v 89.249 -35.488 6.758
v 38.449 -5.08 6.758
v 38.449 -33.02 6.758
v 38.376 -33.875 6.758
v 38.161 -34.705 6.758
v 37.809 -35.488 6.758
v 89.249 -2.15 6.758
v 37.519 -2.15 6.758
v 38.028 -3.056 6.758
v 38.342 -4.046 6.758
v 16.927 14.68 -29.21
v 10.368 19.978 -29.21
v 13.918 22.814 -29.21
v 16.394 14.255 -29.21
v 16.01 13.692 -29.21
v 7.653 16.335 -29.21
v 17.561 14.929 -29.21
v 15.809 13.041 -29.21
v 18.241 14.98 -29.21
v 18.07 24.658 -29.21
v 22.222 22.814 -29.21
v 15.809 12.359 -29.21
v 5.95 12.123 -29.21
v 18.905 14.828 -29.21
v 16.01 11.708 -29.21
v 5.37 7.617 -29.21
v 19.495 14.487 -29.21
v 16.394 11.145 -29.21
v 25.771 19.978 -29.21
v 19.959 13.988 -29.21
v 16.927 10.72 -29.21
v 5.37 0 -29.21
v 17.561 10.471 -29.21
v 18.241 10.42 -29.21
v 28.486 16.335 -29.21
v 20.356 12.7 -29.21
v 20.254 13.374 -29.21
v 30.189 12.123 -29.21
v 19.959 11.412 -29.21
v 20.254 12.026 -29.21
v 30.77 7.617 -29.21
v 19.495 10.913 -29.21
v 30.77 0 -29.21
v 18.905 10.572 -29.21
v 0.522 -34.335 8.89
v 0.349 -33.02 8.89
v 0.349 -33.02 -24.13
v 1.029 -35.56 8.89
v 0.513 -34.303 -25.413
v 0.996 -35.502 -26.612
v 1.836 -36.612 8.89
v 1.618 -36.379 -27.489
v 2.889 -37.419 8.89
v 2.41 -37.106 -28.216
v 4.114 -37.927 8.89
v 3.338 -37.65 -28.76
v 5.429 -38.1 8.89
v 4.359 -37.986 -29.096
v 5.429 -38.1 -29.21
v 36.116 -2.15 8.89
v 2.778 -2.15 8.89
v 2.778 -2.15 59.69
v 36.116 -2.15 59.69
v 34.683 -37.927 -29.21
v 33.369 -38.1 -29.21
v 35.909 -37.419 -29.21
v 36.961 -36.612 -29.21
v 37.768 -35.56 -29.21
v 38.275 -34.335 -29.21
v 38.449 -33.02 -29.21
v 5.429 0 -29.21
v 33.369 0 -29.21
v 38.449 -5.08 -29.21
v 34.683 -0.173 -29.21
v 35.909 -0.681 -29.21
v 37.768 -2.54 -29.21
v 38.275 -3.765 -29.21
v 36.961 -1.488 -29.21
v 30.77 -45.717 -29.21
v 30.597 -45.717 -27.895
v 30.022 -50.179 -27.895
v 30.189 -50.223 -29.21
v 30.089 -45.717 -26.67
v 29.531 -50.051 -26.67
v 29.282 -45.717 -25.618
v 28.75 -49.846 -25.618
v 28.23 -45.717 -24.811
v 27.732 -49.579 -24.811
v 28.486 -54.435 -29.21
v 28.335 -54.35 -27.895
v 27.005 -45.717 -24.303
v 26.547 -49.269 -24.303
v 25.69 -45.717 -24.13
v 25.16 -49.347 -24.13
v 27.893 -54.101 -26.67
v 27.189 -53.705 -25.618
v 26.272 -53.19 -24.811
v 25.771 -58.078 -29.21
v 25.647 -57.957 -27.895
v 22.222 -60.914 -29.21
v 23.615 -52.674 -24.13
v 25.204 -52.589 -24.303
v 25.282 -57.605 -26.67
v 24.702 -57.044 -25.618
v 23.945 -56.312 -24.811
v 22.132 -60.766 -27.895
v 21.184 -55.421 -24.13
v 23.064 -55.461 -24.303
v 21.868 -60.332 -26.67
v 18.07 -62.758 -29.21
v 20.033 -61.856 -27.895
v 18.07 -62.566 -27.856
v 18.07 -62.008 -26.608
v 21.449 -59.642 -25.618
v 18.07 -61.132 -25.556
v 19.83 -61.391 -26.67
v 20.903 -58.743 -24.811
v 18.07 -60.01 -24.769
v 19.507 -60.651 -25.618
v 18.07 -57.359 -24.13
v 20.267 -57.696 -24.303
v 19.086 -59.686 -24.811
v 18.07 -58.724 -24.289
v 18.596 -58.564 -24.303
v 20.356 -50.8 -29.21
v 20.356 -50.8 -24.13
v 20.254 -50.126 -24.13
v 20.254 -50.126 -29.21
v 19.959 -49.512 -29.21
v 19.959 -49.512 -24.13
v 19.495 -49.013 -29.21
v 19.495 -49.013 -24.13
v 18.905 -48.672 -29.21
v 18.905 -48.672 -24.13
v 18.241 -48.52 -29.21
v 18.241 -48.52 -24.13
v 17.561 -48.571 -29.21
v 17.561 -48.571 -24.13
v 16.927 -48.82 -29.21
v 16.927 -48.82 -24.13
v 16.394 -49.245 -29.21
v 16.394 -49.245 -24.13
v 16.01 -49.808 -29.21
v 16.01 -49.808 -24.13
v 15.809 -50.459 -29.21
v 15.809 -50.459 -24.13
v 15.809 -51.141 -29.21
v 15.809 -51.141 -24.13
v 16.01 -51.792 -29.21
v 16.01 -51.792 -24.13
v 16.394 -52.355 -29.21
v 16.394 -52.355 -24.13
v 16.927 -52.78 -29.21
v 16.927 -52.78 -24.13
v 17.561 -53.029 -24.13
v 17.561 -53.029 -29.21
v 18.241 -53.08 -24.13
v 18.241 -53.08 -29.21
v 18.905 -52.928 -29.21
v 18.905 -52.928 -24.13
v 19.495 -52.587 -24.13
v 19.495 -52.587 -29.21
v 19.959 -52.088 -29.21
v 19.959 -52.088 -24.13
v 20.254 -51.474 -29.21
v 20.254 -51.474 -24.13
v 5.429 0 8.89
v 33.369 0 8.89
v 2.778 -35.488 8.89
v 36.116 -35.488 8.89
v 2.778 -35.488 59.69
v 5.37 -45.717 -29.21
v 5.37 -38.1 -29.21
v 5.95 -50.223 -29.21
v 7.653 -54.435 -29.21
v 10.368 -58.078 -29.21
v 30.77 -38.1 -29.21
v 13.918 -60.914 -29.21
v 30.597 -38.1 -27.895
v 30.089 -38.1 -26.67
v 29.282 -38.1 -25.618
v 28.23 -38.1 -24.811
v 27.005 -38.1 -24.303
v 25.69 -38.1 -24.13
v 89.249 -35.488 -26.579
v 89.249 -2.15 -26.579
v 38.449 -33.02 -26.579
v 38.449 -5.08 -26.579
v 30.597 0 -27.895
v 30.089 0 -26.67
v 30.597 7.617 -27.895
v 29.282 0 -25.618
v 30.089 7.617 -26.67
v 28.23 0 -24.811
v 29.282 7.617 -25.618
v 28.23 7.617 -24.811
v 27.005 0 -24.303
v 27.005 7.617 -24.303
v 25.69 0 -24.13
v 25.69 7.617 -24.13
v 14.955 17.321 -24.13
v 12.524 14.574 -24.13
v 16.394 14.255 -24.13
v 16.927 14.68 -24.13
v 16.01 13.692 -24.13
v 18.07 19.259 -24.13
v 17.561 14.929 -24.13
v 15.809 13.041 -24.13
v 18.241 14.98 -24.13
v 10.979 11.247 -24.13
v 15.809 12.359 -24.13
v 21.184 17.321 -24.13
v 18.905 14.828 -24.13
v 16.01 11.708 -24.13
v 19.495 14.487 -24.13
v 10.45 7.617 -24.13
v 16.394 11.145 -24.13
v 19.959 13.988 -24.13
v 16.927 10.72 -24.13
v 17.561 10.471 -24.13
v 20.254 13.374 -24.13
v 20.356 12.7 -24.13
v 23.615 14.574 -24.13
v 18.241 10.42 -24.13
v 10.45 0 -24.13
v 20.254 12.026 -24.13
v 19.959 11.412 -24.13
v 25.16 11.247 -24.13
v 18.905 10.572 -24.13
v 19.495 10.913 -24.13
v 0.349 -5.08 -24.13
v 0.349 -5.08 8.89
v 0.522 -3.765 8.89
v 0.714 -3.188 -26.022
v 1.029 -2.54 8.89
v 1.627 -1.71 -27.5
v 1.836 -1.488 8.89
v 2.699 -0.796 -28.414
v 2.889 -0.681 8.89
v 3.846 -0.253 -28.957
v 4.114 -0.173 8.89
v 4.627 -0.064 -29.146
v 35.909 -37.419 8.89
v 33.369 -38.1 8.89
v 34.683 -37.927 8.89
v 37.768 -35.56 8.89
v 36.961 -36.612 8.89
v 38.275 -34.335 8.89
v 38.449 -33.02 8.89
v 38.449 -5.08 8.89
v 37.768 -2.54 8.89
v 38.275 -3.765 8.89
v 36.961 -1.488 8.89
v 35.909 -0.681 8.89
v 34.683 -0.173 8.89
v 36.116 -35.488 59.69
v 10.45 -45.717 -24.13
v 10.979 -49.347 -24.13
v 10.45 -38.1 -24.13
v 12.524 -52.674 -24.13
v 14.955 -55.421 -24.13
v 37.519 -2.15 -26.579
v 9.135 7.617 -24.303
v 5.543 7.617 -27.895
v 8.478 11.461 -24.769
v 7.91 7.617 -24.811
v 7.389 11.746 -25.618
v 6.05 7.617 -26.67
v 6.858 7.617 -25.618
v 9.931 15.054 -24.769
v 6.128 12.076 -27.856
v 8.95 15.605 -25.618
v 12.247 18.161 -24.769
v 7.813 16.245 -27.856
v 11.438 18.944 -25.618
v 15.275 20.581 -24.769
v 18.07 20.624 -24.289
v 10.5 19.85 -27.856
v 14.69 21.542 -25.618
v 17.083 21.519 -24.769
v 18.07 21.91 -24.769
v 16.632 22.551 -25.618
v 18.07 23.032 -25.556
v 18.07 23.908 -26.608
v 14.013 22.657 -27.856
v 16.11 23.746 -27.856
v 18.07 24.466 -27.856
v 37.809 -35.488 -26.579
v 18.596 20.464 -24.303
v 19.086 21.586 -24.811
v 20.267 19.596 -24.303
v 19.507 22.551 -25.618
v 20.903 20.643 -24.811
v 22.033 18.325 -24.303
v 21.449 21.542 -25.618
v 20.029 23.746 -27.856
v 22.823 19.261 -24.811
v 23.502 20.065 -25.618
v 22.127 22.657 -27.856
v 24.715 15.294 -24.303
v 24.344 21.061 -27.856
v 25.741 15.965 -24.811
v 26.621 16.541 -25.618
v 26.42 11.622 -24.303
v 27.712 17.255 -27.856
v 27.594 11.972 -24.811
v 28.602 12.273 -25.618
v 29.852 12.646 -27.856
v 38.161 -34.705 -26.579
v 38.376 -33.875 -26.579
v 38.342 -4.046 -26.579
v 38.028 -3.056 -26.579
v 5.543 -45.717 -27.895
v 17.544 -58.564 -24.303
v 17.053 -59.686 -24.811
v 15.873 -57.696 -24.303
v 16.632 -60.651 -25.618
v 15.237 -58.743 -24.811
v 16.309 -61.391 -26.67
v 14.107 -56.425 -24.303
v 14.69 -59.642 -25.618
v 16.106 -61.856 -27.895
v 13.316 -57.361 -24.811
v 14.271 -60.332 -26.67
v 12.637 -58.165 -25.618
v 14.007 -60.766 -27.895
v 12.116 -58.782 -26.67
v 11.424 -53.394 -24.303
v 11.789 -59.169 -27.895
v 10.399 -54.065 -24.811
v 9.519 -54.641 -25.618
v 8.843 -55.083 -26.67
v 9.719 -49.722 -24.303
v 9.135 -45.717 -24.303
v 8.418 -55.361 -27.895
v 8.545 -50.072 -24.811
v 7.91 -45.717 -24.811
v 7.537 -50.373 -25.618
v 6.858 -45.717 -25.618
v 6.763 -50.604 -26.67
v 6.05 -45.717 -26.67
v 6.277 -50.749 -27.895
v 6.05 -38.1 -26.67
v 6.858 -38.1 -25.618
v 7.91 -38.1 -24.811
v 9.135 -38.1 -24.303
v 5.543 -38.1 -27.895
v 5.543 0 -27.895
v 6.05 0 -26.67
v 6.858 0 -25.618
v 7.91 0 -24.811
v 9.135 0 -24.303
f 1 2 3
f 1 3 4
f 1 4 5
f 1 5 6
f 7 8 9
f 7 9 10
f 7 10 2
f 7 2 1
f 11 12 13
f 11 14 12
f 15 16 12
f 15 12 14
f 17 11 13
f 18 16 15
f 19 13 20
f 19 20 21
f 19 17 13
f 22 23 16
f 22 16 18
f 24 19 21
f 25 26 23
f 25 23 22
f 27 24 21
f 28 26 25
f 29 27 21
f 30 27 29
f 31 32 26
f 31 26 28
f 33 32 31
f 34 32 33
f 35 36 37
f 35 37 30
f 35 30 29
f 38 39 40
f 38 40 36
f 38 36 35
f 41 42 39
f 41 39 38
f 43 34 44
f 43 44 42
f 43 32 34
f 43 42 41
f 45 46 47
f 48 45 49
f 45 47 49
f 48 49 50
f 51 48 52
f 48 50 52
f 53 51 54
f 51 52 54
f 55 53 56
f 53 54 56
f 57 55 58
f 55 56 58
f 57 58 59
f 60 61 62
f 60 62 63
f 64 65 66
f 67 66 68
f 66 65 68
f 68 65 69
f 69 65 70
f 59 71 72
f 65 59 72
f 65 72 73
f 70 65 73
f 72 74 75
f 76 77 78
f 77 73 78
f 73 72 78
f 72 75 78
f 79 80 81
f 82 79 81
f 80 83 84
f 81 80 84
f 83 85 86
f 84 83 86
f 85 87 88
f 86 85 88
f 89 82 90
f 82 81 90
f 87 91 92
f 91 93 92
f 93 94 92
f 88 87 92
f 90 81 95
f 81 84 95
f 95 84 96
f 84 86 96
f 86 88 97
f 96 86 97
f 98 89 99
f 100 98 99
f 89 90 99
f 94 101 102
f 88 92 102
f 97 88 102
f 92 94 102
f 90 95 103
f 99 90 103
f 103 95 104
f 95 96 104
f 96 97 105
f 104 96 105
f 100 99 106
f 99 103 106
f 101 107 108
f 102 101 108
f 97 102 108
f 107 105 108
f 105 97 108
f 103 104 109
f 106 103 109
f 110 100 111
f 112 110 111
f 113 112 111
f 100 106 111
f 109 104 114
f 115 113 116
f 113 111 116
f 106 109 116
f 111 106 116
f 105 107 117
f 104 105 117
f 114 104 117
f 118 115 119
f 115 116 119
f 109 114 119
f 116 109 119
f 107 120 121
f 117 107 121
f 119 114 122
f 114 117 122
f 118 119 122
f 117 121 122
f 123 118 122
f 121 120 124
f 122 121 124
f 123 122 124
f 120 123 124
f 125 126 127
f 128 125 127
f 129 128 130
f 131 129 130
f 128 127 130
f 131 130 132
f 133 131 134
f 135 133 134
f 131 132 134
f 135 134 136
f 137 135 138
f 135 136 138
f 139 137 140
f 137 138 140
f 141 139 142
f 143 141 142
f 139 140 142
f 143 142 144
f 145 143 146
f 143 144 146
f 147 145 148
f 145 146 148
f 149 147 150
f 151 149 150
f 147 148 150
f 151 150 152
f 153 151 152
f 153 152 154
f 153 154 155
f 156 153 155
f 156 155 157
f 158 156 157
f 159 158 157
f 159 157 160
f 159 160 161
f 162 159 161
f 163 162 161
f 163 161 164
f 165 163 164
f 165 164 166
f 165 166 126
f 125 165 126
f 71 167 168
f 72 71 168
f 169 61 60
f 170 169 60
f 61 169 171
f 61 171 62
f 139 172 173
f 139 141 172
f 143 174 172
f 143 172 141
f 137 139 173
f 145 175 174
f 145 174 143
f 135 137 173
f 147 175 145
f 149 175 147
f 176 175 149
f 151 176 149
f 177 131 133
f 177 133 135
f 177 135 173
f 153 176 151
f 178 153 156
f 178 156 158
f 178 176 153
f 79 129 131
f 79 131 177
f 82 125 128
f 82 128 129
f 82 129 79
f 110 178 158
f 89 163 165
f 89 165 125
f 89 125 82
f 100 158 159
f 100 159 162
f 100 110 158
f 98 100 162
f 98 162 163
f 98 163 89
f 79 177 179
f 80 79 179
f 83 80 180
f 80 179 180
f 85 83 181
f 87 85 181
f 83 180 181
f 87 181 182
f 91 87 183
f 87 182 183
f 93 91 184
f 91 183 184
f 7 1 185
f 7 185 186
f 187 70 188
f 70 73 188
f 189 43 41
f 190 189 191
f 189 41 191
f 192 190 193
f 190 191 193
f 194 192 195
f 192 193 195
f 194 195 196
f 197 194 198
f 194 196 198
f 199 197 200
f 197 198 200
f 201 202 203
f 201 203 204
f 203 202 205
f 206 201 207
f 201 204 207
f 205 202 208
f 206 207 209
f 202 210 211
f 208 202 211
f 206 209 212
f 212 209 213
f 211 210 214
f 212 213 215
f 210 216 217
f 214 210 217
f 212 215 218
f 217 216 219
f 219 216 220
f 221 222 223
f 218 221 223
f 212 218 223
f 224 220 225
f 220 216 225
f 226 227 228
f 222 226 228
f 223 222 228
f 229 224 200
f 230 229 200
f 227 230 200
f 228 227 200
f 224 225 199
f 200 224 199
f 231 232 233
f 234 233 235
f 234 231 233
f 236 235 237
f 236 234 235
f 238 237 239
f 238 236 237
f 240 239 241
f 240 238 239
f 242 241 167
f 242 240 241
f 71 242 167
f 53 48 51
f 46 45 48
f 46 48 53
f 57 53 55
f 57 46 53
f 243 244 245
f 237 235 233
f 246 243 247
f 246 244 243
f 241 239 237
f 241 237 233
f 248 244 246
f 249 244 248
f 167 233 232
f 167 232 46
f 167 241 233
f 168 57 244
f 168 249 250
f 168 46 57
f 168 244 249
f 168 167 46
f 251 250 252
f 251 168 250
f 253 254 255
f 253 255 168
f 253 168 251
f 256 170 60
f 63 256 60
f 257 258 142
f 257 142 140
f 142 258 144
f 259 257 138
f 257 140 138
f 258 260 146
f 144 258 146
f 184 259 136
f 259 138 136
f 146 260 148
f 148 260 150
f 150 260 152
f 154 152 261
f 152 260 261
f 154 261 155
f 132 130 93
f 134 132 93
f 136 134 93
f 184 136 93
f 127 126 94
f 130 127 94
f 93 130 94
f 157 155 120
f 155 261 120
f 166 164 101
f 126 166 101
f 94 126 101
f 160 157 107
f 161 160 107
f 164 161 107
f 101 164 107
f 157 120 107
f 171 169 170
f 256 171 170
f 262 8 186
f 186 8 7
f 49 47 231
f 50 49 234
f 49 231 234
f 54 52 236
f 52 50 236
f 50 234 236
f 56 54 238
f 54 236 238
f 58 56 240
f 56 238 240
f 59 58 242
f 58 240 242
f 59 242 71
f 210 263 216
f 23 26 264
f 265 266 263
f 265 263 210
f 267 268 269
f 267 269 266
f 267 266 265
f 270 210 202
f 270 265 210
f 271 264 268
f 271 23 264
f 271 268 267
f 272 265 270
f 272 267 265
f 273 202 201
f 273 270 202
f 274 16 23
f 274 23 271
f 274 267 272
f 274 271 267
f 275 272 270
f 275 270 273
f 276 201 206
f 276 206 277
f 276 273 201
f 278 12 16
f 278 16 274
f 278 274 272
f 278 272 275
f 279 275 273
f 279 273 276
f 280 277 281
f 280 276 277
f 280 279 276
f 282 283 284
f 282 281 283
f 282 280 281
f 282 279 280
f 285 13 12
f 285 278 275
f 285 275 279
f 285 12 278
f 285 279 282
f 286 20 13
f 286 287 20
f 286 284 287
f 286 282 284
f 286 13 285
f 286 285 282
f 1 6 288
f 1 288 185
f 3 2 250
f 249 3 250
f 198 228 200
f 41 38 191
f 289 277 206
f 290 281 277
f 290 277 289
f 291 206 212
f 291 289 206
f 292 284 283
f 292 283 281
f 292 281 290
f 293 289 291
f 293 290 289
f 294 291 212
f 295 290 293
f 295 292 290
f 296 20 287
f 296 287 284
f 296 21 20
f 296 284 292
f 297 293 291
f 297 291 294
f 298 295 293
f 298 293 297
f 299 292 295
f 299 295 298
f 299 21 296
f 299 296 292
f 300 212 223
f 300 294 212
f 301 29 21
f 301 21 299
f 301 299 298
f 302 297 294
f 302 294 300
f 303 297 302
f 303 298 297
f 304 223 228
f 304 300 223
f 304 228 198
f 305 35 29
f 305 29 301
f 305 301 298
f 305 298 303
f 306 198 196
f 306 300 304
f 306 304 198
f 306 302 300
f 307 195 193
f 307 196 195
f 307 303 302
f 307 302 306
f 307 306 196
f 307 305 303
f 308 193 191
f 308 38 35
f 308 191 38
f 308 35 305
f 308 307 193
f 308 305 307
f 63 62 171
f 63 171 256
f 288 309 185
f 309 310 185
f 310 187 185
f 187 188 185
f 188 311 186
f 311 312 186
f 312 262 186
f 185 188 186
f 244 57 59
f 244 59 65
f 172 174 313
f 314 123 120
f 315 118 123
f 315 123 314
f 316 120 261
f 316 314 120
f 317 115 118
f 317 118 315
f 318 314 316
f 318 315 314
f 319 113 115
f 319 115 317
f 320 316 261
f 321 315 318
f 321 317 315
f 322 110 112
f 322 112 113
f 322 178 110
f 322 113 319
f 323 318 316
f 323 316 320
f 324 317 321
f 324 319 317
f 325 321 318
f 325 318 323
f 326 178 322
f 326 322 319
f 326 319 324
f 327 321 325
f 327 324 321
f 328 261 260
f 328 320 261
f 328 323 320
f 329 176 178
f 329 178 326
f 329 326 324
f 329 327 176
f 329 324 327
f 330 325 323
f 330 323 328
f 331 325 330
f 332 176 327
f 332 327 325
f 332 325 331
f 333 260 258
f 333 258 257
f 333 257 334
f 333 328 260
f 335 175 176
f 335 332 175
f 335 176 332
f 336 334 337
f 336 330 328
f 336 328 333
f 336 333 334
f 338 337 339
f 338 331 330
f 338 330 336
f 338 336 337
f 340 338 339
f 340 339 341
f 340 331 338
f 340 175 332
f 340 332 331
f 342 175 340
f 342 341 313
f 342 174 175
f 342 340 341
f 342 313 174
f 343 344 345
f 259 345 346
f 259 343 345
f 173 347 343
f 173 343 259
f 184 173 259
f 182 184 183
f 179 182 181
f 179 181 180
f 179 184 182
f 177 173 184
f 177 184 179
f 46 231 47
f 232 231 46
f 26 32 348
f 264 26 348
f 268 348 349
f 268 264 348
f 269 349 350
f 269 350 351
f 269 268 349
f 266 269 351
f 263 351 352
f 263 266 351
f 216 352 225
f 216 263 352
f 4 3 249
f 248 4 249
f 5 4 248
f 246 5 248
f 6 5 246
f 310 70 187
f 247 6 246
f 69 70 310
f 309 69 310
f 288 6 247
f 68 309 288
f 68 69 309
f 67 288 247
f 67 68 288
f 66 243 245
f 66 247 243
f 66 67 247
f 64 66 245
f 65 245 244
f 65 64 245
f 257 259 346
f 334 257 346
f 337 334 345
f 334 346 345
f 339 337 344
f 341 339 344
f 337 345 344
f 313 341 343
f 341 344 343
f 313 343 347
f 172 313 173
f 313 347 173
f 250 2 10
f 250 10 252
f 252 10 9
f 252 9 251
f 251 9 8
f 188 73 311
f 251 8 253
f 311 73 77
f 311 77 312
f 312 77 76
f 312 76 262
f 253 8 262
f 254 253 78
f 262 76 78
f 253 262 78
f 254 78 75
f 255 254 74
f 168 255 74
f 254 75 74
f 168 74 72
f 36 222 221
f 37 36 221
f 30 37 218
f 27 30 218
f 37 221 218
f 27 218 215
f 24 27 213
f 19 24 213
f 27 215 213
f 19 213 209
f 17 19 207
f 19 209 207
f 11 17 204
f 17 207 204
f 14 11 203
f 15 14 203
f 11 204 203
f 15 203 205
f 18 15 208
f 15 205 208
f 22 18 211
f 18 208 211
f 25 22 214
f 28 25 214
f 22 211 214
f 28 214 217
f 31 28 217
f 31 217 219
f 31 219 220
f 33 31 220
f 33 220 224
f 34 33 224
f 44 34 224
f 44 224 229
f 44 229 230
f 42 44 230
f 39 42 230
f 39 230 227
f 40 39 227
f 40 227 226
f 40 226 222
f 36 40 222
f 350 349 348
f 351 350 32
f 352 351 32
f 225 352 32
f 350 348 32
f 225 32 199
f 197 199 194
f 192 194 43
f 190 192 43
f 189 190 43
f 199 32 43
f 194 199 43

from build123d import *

# Parameters (mm, degrees)
F0_W           = 38.1
F0_H           = 38.1
F1_DEPTH       = 38.1
F2_W           = 33.3375
F2_H           = 33.3375
F3_DEPTH       = 50.8
F4_W           = 33.3375
F4_H           = 33.3375
F5_DEPTH       = 50.8
F6_W           = 25.4
F6_H           = 25.4
F7_DEPTH       = 5.08
F8_R           = 2.286
F9_DEPTH       = 83.82
F10_T1_DEPTH   = 93.9954855022
F10_2_T1_DEPTH = 93.9954855022
F11_T1_DEPTH   = 63.5
F11_T3_DEPTH   = 63.5
F11_T8_DEPTH   = 63.5
F11_T14_DEPTH  = 63.5
F11_T20_DEPTH  = 63.5
F11_T27_DEPTH  = 63.5
F11_T33_DEPTH  = 63.5
F11_T39_DEPTH  = 63.5
F11_T45_DEPTH  = 63.5
F11_T51_DEPTH  = 63.5
F11_T58_DEPTH  = 63.5
F11_T64_DEPTH  = 63.5
F11_2_T1_DEPTH = 20.3169028996
F11_2_T4_ANGLE = 114.3203710668
F11_2_T6_ANGLE = 114.3203710677
F11_3_T1_DEPTH = 20.3169028996
F11_3_T4_ANGLE = 114.3203710668
F11_3_T6_ANGLE = 114.3203710677


# Not quite as in the source:
# - a fillet or chamfer that OpenCascade refuses, or shapes differently, is made with other operations: its cross-section is extruded or revolved along the edge and cut away or added


with BuildPart() as f1:
    # F0 (on Front) → F1 (new body)
    with BuildSketch(Plane.XZ):
        with Locations((19.3985427063, -10.1599991322)):
            Rectangle(F0_W, F0_H)
    extrude(amount=F1_DEPTH)

    # F2 (on face) → F3 (join)
    with BuildSketch(Plane.YZ.offset(38.4485427063)):
        with Locations((-18.8190903282, -9.9104456074)):
            Rectangle(F2_W, F2_H)
    extrude(amount=F3_DEPTH)

    # F11: fillet of radius 5.08 on 5 edges, made by hand

    # F11_s2 → F11_t1 (cut)
    with BuildSketch(Plane.XY.offset(-41.9099991322)):
        with BuildLine():
            ThreePointArc((0.3485427063, -5.08), (1.8364402579, -1.4878975516), (5.4285427063, 0))
            Line((5.4285427063, 0), (0.3485427063, 0))
            Line((0.3485427063, 0), (0.3485427063, -5.08))
        make_face()
        with BuildLine():
            ThreePointArc((0.3485427063, -33.02), (1.8364402579, -36.6121024484), (5.4285427063, -38.1))
            Line((5.4285427063, -38.1), (0.3485427063, -38.1))
            Line((0.3485427063, -38.1), (0.3485427063, -33.02))
        make_face()
    extrude(amount=F11_T1_DEPTH, mode=Mode.SUBTRACT)

    # F11_s4 → F11_t3 (cut)
    with BuildSketch(Plane.XZ.offset(-12.7)):
        with BuildLine():
            ThreePointArc((0.3485427063, -24.1299991322), (1.8364402579, -27.7221015806), (5.4285427063, -29.2099991322))
            Line((5.4285427063, -29.2099991322), (0.3485427063, -29.2099991322))
            Line((0.3485427063, -29.2099991322), (0.3485427063, -24.1299991322))
        make_face()
    extrude(amount=F11_T3_DEPTH, mode=Mode.SUBTRACT)


with BuildPart() as f5:
    # F4 (on face) → F5 (new body)
    with BuildSketch(Plane.XY.offset(8.8900008678)):
        with Locations((19.4469346859, -18.8190890476)):
            Rectangle(F4_W, F4_H)
    extrude(amount=F5_DEPTH)


with BuildPart() as f7:
    # F6 (on face) → F7 (new body)
    with BuildSketch(Plane(origin=(0, 0, -29.2099991322), x_dir=(1, 0, 0), z_dir=(0, 0, -1))):
        with Locations((18.0697256371, -12.7)):
            Rectangle(F6_W, F6_H)
    extrude(amount=-F7_DEPTH)


with BuildPart() as f7b:
    # F6 (on face) → F7, piece 2 (new body)
    with BuildSketch(Plane(origin=(0, 0, -29.2099991322), x_dir=(1, 0, 0), z_dir=(0, 0, -1))):
        with Locations((18.0697256371, 50.8)):
            Rectangle(F6_W, F6_H)
    extrude(amount=-F7_DEPTH)


with BuildPart() as f9_tool:
    # F8 (on face) → F9 (new body)
    with BuildSketch(Plane.XY.offset(-24.1299991322)):
        with Locations((18.0697256371, -50.8)):
            Circle(F8_R)
        with Locations((18.0697256371, 12.7)):
            Circle(F8_R)
    extrude(amount=-F9_DEPTH)


with BuildPart() as f7_1:
    add(f7.part)

    # F9: cut by f9_tool
    add(f9_tool.part, mode=Mode.SUBTRACT)

    # F10: fillet of radius 17.7830971004 on 2 edges, made by hand

    # F10_s2 → F10_t1 (cut)
    with BuildSketch(Plane.XY.offset(-73.6677418833)):
        with BuildLine():
            ThreePointArc((5.3697256371, 7.6169028996), (10.5782741874, 20.1914514498), (23.1528227376, 25.4))
            Line((23.1528227376, 25.4), (5.3697256371, 25.4))
            Line((5.3697256371, 25.4), (5.3697256371, 7.6169028996))
        make_face()
        with BuildLine():
            ThreePointArc((30.7697256371, 7.6169028996), (25.5611770869, 20.1914514498), (12.9866285367, 25.4))
            Line((12.9866285367, 25.4), (30.7697256371, 25.4))
            Line((30.7697256371, 25.4), (30.7697256371, 7.6169028996))
        make_face()
    extrude(amount=F10_T1_DEPTH, mode=Mode.SUBTRACT)

    # F11#2: fillet of radius 5.08 on 2 edges, made by hand

    # F11_2_s2 → F11_2_t1 (cut)
    with BuildSketch(Plane.XZ.offset(-7.6169028996)):
        with BuildLine():
            ThreePointArc((30.7697256371, -29.2099991322), (29.2818280856, -25.6178966837), (25.6897256371, -24.1299991322))
            Line((25.6897256371, -24.1299991322), (30.7697256371, -24.1299991322))
            Line((30.7697256371, -24.1299991322), (30.7697256371, -29.2099991322))
        make_face()
        with BuildLine():
            ThreePointArc((5.3697256371, -29.2099991322), (6.8576231887, -25.6178966837), (10.4497256371, -24.1299991322))
            Line((10.4497256371, -24.1299991322), (5.3697256371, -24.1299991322))
            Line((5.3697256371, -24.1299991322), (5.3697256371, -29.2099991322))
        make_face()
    extrude(amount=F11_2_T1_DEPTH, mode=Mode.SUBTRACT)

    # F11_2_s3 → F11_2_t4 (revolve, cut)
    with BuildSketch(Plane.XZ.offset(-7.6169028995)):
        with BuildLine():
            ThreePointArc((10.4497256371, -24.1299991322), (6.8576231887, -25.6178966837), (5.3697256371, -29.2099991322))
            Line((5.3697256371, -29.2099991322), (5.3697256371, -24.1299991322))
            Line((5.3697256371, -24.1299991322), (10.4497256371, -24.1299991322))
        make_face()
    revolve(axis=Axis((23.1528227376, 7.6169028995, -24.1299991322), (0, 0, -1)), revolution_arc=F11_2_T4_ANGLE, mode=Mode.SUBTRACT)

    # F11_2_s5 → F11_2_t6 (revolve, cut)
    with BuildSketch(Plane(origin=(13.6425072573, 6.165668504, 0), x_dir=(0, 0, 1), z_dir=(-0.9112569083, -0.4118383749, 0))):
        with BuildLine():
            ThreePointArc((-24.1299991322, 14.2956604954), (-25.6178966837, 17.8877629438), (-29.2099991322, 19.3756604954))
            Line((-29.2099991322, 19.3756604954), (-24.1299991322, 19.3756604954))
            Line((-24.1299991322, 19.3756604954), (-24.1299991322, 14.2956604954))
        make_face()
    revolve(axis=Axis((12.9866285367, 7.6169028996, -24.1299991322), (0, 0, -1)), revolution_arc=F11_2_T6_ANGLE, mode=Mode.SUBTRACT)


with BuildPart() as f7b_1:
    add(f7b.part)

    # F9: cut by f9_tool
    add(f9_tool.part, mode=Mode.SUBTRACT)

    # F10#2: fillet of radius 17.7830971004 on 2 edges, made by hand

    # F10_2_s2 → F10_2_t1 (cut)
    with BuildSketch(Plane.XY.offset(-73.6677418833)):
        with BuildLine():
            ThreePointArc((23.1528227376, -63.5), (10.5782741874, -58.2914514498), (5.3697256371, -45.7169028996))
            Line((5.3697256371, -45.7169028996), (5.3697256371, -63.5))
            Line((5.3697256371, -63.5), (23.1528227376, -63.5))
        make_face()
        with BuildLine():
            ThreePointArc((12.9866285367, -63.5), (25.5611770869, -58.2914514498), (30.7697256371, -45.7169028996))
            Line((30.7697256371, -45.7169028996), (30.7697256371, -63.5))
            Line((30.7697256371, -63.5), (12.9866285367, -63.5))
        make_face()
    extrude(amount=F10_2_T1_DEPTH, mode=Mode.SUBTRACT)

    # F11#3: fillet of radius 5.08 on 2 edges, made by hand

    # F11_3_s2 → F11_3_t1 (cut)
    with BuildSketch(Plane.XZ.offset(25.4)):
        with BuildLine():
            ThreePointArc((30.7697256371, -29.2099991322), (29.2818280856, -25.6178966837), (25.6897256371, -24.1299991322))
            Line((25.6897256371, -24.1299991322), (30.7697256371, -24.1299991322))
            Line((30.7697256371, -24.1299991322), (30.7697256371, -29.2099991322))
        make_face()
        with BuildLine():
            ThreePointArc((10.4497256371, -24.1299991322), (6.8576231887, -25.6178966837), (5.3697256371, -29.2099991322))
            Line((5.3697256371, -29.2099991322), (5.3697256371, -24.1299991322))
            Line((5.3697256371, -24.1299991322), (10.4497256371, -24.1299991322))
        make_face()
    extrude(amount=F11_3_T1_DEPTH, mode=Mode.SUBTRACT)

    # F11_3_s3 → F11_3_t4 (revolve, cut)
    with BuildSketch(Plane(origin=(2.0687305768, 0.9349532839, 0), x_dir=(0, 0, 1), z_dir=(0.9112569083, 0.4118383749, 0))):
        with BuildLine():
            ThreePointArc((-24.1299991322, 63.8981615853), (-25.6178966837, 67.4902640337), (-29.2099991322, 68.9781615853))
            Line((-29.2099991322, 68.9781615853), (-24.1299991322, 68.9781615853))
            Line((-24.1299991322, 68.9781615853), (-24.1299991322, 63.8981615853))
        make_face()
    revolve(axis=Axis((23.1528227376, -45.7169028995, -24.1299991322), (0, 0, -1)), revolution_arc=F11_3_T4_ANGLE, mode=Mode.SUBTRACT)

    # F11_3_s5 → F11_3_t6 (revolve, cut)
    with BuildSketch(Plane.XZ.offset(45.7169028996)):
        with BuildLine():
            ThreePointArc((30.7697256371, -29.2099991322), (29.2818280855, -25.6178966837), (25.6897256371, -24.1299991322))
            Line((25.6897256371, -24.1299991322), (30.7697256371, -24.1299991322))
            Line((30.7697256371, -24.1299991322), (30.7697256371, -29.2099991322))
        make_face()
    revolve(axis=Axis((12.9866285367, -45.7169028996, -24.1299991322), (0, 0, -1)), revolution_arc=F11_3_T6_ANGLE, mode=Mode.SUBTRACT)


with BuildPart() as f11_tool6:
    # F11_s7 → F11_t8 (new body)
    with BuildSketch(Plane.XY.offset(-41.9099991322)):
        with BuildLine():
            ThreePointArc((38.4485427063, -5.08), (36.9606451548, -1.4878975516), (33.3685427063, 0))
            Line((33.3685427063, 0), (38.4485427063, 0))
            Line((38.4485427063, 0), (38.4485427063, -5.08))
        make_face()
    extrude(amount=F11_T8_DEPTH)

    split(bisect_by=Plane.XZ.offset(2.1503403282), keep=Keep.TOP)

    split(bisect_by=Plane.XY.offset(-26.5791956074), keep=Keep.BOTTOM)


with BuildPart() as f1_1:
    add(f1.part)

    # F11_t5: cut F11_tool6
    add(f11_tool6.part, mode=Mode.SUBTRACT)


with BuildPart() as f11_tool12:
    # F11_s13 → F11_t14 (new body)
    with BuildSketch(Plane.XY.offset(-41.9099991322)):
        with BuildLine():
            ThreePointArc((38.4485427063, -5.08), (36.9606451548, -1.4878975516), (33.3685427063, 0))
            Line((33.3685427063, 0), (38.4485427063, 0))
            Line((38.4485427063, 0), (38.4485427063, -5.08))
        make_face()
    extrude(amount=F11_T14_DEPTH)

    split(bisect_by=Plane.XZ.offset(2.1503403282), keep=Keep.BOTTOM)

    split(bisect_by=Plane.XY.offset(-26.5791956074), keep=Keep.BOTTOM)


with BuildPart() as f1_2:
    add(f1_1.part)

    # F11_t11: cut F11_tool12
    add(f11_tool12.part, mode=Mode.SUBTRACT)


with BuildPart() as f11_tool18:
    # F11_s19 → F11_t20 (new body)
    with BuildSketch(Plane.XY.offset(-41.9099991322)):
        with BuildLine():
            ThreePointArc((38.4485427063, -5.08), (36.9606451548, -1.4878975516), (33.3685427063, 0))
            Line((33.3685427063, 0), (38.4485427063, 0))
            Line((38.4485427063, 0), (38.4485427063, -5.08))
        make_face()
    extrude(amount=F11_T20_DEPTH)

    split(bisect_by=Plane.XZ.offset(2.1503403282), keep=Keep.BOTTOM)

    split(bisect_by=Plane.XY.offset(-26.5791956074), keep=Keep.TOP)

    split(bisect_by=Plane.XY.offset(6.7583043926), keep=Keep.BOTTOM)


with BuildPart() as f1_3:
    add(f1_2.part)

    # F11_t17: cut F11_tool18
    add(f11_tool18.part, mode=Mode.SUBTRACT)


with BuildPart() as f11_tool25:
    # F11_s26 → F11_t27 (new body)
    with BuildSketch(Plane.XY.offset(-41.9099991322)):
        with BuildLine():
            ThreePointArc((38.4485427063, -5.08), (36.9606451548, -1.4878975516), (33.3685427063, 0))
            Line((33.3685427063, 0), (38.4485427063, 0))
            Line((38.4485427063, 0), (38.4485427063, -5.08))
        make_face()
    extrude(amount=F11_T27_DEPTH)

    split(bisect_by=Plane.XZ.offset(2.1503403282), keep=Keep.TOP)

    split(bisect_by=Plane.XY.offset(6.7583043926), keep=Keep.TOP)


with BuildPart() as f1_4:
    add(f1_3.part)

    # F11_t24: cut F11_tool25
    add(f11_tool25.part, mode=Mode.SUBTRACT)


with BuildPart() as f11_tool31:
    # F11_s32 → F11_t33 (new body)
    with BuildSketch(Plane.XY.offset(-41.9099991322)):
        with BuildLine():
            ThreePointArc((38.4485427063, -5.08), (36.9606451548, -1.4878975516), (33.3685427063, 0))
            Line((33.3685427063, 0), (38.4485427063, 0))
            Line((38.4485427063, 0), (38.4485427063, -5.08))
        make_face()
    extrude(amount=F11_T33_DEPTH)

    split(bisect_by=Plane.XZ.offset(2.1503403282), keep=Keep.BOTTOM)

    split(bisect_by=Plane.XY.offset(6.7583043926), keep=Keep.TOP)


with BuildPart() as f1_5:
    add(f1_4.part)

    # F11_t30: cut F11_tool31
    add(f11_tool31.part, mode=Mode.SUBTRACT)


with BuildPart() as f11_tool37:
    # F11_s38 → F11_t39 (new body)
    with BuildSketch(Plane.XY.offset(-41.9099991322)):
        with BuildLine():
            ThreePointArc((38.4485427063, -33.02), (36.9606451548, -36.6121024484), (33.3685427063, -38.1))
            Line((33.3685427063, -38.1), (38.4485427063, -38.1))
            Line((38.4485427063, -38.1), (38.4485427063, -33.02))
        make_face()
    extrude(amount=F11_T39_DEPTH)

    split(bisect_by=Plane.XY.offset(-26.5791956074), keep=Keep.BOTTOM)

    split(bisect_by=Plane.XZ.offset(35.4878403282), keep=Keep.BOTTOM)


with BuildPart() as f1_6:
    add(f1_5.part)

    # F11_t36: cut F11_tool37
    add(f11_tool37.part, mode=Mode.SUBTRACT)


with BuildPart() as f11_tool43:
    # F11_s44 → F11_t45 (new body)
    with BuildSketch(Plane.XY.offset(-41.9099991322)):
        with BuildLine():
            ThreePointArc((38.4485427063, -33.02), (36.9606451548, -36.6121024484), (33.3685427063, -38.1))
            Line((33.3685427063, -38.1), (38.4485427063, -38.1))
            Line((38.4485427063, -38.1), (38.4485427063, -33.02))
        make_face()
    extrude(amount=F11_T45_DEPTH)

    split(bisect_by=Plane.XY.offset(-26.5791956074), keep=Keep.BOTTOM)

    split(bisect_by=Plane.XZ.offset(35.4878403282), keep=Keep.TOP)


with BuildPart() as f1_7:
    add(f1_6.part)

    # F11_t42: cut F11_tool43
    add(f11_tool43.part, mode=Mode.SUBTRACT)


with BuildPart() as f11_tool49:
    # F11_s50 → F11_t51 (new body)
    with BuildSketch(Plane.XY.offset(-41.9099991322)):
        with BuildLine():
            ThreePointArc((38.4485427063, -33.02), (36.9606451548, -36.6121024484), (33.3685427063, -38.1))
            Line((33.3685427063, -38.1), (38.4485427063, -38.1))
            Line((38.4485427063, -38.1), (38.4485427063, -33.02))
        make_face()
    extrude(amount=F11_T51_DEPTH)

    split(bisect_by=Plane.XY.offset(-26.5791956074), keep=Keep.TOP)

    split(bisect_by=Plane.XZ.offset(35.4878403282), keep=Keep.TOP)

    split(bisect_by=Plane.XY.offset(6.7583043926), keep=Keep.BOTTOM)


with BuildPart() as f1_8:
    add(f1_7.part)

    # F11_t48: cut F11_tool49
    add(f11_tool49.part, mode=Mode.SUBTRACT)


with BuildPart() as f11_tool56:
    # F11_s57 → F11_t58 (new body)
    with BuildSketch(Plane.XY.offset(-41.9099991322)):
        with BuildLine():
            ThreePointArc((38.4485427063, -33.02), (36.9606451548, -36.6121024484), (33.3685427063, -38.1))
            Line((33.3685427063, -38.1), (38.4485427063, -38.1))
            Line((38.4485427063, -38.1), (38.4485427063, -33.02))
        make_face()
    extrude(amount=F11_T58_DEPTH)

    split(bisect_by=Plane.XZ.offset(35.4878403282), keep=Keep.BOTTOM)

    split(bisect_by=Plane.XY.offset(6.7583043926), keep=Keep.TOP)


with BuildPart() as f1_9:
    add(f1_8.part)

    # F11_t55: cut F11_tool56
    add(f11_tool56.part, mode=Mode.SUBTRACT)


with BuildPart() as f11_tool62:
    # F11_s63 → F11_t64 (new body)
    with BuildSketch(Plane.XY.offset(-41.9099991322)):
        with BuildLine():
            ThreePointArc((38.4485427063, -33.02), (36.9606451548, -36.6121024484), (33.3685427063, -38.1))
            Line((33.3685427063, -38.1), (38.4485427063, -38.1))
            Line((38.4485427063, -38.1), (38.4485427063, -33.02))
        make_face()
    extrude(amount=F11_T64_DEPTH)

    split(bisect_by=Plane.XZ.offset(35.4878403282), keep=Keep.TOP)

    split(bisect_by=Plane.XY.offset(6.7583043926), keep=Keep.TOP)


with BuildPart() as f1_10:
    add(f1_9.part)

    # F11_t61: cut F11_tool62
    add(f11_tool62.part, mode=Mode.SUBTRACT)


solid = Compound([f5.part, f7_1.part, f7b_1.part, f1_10.part])
